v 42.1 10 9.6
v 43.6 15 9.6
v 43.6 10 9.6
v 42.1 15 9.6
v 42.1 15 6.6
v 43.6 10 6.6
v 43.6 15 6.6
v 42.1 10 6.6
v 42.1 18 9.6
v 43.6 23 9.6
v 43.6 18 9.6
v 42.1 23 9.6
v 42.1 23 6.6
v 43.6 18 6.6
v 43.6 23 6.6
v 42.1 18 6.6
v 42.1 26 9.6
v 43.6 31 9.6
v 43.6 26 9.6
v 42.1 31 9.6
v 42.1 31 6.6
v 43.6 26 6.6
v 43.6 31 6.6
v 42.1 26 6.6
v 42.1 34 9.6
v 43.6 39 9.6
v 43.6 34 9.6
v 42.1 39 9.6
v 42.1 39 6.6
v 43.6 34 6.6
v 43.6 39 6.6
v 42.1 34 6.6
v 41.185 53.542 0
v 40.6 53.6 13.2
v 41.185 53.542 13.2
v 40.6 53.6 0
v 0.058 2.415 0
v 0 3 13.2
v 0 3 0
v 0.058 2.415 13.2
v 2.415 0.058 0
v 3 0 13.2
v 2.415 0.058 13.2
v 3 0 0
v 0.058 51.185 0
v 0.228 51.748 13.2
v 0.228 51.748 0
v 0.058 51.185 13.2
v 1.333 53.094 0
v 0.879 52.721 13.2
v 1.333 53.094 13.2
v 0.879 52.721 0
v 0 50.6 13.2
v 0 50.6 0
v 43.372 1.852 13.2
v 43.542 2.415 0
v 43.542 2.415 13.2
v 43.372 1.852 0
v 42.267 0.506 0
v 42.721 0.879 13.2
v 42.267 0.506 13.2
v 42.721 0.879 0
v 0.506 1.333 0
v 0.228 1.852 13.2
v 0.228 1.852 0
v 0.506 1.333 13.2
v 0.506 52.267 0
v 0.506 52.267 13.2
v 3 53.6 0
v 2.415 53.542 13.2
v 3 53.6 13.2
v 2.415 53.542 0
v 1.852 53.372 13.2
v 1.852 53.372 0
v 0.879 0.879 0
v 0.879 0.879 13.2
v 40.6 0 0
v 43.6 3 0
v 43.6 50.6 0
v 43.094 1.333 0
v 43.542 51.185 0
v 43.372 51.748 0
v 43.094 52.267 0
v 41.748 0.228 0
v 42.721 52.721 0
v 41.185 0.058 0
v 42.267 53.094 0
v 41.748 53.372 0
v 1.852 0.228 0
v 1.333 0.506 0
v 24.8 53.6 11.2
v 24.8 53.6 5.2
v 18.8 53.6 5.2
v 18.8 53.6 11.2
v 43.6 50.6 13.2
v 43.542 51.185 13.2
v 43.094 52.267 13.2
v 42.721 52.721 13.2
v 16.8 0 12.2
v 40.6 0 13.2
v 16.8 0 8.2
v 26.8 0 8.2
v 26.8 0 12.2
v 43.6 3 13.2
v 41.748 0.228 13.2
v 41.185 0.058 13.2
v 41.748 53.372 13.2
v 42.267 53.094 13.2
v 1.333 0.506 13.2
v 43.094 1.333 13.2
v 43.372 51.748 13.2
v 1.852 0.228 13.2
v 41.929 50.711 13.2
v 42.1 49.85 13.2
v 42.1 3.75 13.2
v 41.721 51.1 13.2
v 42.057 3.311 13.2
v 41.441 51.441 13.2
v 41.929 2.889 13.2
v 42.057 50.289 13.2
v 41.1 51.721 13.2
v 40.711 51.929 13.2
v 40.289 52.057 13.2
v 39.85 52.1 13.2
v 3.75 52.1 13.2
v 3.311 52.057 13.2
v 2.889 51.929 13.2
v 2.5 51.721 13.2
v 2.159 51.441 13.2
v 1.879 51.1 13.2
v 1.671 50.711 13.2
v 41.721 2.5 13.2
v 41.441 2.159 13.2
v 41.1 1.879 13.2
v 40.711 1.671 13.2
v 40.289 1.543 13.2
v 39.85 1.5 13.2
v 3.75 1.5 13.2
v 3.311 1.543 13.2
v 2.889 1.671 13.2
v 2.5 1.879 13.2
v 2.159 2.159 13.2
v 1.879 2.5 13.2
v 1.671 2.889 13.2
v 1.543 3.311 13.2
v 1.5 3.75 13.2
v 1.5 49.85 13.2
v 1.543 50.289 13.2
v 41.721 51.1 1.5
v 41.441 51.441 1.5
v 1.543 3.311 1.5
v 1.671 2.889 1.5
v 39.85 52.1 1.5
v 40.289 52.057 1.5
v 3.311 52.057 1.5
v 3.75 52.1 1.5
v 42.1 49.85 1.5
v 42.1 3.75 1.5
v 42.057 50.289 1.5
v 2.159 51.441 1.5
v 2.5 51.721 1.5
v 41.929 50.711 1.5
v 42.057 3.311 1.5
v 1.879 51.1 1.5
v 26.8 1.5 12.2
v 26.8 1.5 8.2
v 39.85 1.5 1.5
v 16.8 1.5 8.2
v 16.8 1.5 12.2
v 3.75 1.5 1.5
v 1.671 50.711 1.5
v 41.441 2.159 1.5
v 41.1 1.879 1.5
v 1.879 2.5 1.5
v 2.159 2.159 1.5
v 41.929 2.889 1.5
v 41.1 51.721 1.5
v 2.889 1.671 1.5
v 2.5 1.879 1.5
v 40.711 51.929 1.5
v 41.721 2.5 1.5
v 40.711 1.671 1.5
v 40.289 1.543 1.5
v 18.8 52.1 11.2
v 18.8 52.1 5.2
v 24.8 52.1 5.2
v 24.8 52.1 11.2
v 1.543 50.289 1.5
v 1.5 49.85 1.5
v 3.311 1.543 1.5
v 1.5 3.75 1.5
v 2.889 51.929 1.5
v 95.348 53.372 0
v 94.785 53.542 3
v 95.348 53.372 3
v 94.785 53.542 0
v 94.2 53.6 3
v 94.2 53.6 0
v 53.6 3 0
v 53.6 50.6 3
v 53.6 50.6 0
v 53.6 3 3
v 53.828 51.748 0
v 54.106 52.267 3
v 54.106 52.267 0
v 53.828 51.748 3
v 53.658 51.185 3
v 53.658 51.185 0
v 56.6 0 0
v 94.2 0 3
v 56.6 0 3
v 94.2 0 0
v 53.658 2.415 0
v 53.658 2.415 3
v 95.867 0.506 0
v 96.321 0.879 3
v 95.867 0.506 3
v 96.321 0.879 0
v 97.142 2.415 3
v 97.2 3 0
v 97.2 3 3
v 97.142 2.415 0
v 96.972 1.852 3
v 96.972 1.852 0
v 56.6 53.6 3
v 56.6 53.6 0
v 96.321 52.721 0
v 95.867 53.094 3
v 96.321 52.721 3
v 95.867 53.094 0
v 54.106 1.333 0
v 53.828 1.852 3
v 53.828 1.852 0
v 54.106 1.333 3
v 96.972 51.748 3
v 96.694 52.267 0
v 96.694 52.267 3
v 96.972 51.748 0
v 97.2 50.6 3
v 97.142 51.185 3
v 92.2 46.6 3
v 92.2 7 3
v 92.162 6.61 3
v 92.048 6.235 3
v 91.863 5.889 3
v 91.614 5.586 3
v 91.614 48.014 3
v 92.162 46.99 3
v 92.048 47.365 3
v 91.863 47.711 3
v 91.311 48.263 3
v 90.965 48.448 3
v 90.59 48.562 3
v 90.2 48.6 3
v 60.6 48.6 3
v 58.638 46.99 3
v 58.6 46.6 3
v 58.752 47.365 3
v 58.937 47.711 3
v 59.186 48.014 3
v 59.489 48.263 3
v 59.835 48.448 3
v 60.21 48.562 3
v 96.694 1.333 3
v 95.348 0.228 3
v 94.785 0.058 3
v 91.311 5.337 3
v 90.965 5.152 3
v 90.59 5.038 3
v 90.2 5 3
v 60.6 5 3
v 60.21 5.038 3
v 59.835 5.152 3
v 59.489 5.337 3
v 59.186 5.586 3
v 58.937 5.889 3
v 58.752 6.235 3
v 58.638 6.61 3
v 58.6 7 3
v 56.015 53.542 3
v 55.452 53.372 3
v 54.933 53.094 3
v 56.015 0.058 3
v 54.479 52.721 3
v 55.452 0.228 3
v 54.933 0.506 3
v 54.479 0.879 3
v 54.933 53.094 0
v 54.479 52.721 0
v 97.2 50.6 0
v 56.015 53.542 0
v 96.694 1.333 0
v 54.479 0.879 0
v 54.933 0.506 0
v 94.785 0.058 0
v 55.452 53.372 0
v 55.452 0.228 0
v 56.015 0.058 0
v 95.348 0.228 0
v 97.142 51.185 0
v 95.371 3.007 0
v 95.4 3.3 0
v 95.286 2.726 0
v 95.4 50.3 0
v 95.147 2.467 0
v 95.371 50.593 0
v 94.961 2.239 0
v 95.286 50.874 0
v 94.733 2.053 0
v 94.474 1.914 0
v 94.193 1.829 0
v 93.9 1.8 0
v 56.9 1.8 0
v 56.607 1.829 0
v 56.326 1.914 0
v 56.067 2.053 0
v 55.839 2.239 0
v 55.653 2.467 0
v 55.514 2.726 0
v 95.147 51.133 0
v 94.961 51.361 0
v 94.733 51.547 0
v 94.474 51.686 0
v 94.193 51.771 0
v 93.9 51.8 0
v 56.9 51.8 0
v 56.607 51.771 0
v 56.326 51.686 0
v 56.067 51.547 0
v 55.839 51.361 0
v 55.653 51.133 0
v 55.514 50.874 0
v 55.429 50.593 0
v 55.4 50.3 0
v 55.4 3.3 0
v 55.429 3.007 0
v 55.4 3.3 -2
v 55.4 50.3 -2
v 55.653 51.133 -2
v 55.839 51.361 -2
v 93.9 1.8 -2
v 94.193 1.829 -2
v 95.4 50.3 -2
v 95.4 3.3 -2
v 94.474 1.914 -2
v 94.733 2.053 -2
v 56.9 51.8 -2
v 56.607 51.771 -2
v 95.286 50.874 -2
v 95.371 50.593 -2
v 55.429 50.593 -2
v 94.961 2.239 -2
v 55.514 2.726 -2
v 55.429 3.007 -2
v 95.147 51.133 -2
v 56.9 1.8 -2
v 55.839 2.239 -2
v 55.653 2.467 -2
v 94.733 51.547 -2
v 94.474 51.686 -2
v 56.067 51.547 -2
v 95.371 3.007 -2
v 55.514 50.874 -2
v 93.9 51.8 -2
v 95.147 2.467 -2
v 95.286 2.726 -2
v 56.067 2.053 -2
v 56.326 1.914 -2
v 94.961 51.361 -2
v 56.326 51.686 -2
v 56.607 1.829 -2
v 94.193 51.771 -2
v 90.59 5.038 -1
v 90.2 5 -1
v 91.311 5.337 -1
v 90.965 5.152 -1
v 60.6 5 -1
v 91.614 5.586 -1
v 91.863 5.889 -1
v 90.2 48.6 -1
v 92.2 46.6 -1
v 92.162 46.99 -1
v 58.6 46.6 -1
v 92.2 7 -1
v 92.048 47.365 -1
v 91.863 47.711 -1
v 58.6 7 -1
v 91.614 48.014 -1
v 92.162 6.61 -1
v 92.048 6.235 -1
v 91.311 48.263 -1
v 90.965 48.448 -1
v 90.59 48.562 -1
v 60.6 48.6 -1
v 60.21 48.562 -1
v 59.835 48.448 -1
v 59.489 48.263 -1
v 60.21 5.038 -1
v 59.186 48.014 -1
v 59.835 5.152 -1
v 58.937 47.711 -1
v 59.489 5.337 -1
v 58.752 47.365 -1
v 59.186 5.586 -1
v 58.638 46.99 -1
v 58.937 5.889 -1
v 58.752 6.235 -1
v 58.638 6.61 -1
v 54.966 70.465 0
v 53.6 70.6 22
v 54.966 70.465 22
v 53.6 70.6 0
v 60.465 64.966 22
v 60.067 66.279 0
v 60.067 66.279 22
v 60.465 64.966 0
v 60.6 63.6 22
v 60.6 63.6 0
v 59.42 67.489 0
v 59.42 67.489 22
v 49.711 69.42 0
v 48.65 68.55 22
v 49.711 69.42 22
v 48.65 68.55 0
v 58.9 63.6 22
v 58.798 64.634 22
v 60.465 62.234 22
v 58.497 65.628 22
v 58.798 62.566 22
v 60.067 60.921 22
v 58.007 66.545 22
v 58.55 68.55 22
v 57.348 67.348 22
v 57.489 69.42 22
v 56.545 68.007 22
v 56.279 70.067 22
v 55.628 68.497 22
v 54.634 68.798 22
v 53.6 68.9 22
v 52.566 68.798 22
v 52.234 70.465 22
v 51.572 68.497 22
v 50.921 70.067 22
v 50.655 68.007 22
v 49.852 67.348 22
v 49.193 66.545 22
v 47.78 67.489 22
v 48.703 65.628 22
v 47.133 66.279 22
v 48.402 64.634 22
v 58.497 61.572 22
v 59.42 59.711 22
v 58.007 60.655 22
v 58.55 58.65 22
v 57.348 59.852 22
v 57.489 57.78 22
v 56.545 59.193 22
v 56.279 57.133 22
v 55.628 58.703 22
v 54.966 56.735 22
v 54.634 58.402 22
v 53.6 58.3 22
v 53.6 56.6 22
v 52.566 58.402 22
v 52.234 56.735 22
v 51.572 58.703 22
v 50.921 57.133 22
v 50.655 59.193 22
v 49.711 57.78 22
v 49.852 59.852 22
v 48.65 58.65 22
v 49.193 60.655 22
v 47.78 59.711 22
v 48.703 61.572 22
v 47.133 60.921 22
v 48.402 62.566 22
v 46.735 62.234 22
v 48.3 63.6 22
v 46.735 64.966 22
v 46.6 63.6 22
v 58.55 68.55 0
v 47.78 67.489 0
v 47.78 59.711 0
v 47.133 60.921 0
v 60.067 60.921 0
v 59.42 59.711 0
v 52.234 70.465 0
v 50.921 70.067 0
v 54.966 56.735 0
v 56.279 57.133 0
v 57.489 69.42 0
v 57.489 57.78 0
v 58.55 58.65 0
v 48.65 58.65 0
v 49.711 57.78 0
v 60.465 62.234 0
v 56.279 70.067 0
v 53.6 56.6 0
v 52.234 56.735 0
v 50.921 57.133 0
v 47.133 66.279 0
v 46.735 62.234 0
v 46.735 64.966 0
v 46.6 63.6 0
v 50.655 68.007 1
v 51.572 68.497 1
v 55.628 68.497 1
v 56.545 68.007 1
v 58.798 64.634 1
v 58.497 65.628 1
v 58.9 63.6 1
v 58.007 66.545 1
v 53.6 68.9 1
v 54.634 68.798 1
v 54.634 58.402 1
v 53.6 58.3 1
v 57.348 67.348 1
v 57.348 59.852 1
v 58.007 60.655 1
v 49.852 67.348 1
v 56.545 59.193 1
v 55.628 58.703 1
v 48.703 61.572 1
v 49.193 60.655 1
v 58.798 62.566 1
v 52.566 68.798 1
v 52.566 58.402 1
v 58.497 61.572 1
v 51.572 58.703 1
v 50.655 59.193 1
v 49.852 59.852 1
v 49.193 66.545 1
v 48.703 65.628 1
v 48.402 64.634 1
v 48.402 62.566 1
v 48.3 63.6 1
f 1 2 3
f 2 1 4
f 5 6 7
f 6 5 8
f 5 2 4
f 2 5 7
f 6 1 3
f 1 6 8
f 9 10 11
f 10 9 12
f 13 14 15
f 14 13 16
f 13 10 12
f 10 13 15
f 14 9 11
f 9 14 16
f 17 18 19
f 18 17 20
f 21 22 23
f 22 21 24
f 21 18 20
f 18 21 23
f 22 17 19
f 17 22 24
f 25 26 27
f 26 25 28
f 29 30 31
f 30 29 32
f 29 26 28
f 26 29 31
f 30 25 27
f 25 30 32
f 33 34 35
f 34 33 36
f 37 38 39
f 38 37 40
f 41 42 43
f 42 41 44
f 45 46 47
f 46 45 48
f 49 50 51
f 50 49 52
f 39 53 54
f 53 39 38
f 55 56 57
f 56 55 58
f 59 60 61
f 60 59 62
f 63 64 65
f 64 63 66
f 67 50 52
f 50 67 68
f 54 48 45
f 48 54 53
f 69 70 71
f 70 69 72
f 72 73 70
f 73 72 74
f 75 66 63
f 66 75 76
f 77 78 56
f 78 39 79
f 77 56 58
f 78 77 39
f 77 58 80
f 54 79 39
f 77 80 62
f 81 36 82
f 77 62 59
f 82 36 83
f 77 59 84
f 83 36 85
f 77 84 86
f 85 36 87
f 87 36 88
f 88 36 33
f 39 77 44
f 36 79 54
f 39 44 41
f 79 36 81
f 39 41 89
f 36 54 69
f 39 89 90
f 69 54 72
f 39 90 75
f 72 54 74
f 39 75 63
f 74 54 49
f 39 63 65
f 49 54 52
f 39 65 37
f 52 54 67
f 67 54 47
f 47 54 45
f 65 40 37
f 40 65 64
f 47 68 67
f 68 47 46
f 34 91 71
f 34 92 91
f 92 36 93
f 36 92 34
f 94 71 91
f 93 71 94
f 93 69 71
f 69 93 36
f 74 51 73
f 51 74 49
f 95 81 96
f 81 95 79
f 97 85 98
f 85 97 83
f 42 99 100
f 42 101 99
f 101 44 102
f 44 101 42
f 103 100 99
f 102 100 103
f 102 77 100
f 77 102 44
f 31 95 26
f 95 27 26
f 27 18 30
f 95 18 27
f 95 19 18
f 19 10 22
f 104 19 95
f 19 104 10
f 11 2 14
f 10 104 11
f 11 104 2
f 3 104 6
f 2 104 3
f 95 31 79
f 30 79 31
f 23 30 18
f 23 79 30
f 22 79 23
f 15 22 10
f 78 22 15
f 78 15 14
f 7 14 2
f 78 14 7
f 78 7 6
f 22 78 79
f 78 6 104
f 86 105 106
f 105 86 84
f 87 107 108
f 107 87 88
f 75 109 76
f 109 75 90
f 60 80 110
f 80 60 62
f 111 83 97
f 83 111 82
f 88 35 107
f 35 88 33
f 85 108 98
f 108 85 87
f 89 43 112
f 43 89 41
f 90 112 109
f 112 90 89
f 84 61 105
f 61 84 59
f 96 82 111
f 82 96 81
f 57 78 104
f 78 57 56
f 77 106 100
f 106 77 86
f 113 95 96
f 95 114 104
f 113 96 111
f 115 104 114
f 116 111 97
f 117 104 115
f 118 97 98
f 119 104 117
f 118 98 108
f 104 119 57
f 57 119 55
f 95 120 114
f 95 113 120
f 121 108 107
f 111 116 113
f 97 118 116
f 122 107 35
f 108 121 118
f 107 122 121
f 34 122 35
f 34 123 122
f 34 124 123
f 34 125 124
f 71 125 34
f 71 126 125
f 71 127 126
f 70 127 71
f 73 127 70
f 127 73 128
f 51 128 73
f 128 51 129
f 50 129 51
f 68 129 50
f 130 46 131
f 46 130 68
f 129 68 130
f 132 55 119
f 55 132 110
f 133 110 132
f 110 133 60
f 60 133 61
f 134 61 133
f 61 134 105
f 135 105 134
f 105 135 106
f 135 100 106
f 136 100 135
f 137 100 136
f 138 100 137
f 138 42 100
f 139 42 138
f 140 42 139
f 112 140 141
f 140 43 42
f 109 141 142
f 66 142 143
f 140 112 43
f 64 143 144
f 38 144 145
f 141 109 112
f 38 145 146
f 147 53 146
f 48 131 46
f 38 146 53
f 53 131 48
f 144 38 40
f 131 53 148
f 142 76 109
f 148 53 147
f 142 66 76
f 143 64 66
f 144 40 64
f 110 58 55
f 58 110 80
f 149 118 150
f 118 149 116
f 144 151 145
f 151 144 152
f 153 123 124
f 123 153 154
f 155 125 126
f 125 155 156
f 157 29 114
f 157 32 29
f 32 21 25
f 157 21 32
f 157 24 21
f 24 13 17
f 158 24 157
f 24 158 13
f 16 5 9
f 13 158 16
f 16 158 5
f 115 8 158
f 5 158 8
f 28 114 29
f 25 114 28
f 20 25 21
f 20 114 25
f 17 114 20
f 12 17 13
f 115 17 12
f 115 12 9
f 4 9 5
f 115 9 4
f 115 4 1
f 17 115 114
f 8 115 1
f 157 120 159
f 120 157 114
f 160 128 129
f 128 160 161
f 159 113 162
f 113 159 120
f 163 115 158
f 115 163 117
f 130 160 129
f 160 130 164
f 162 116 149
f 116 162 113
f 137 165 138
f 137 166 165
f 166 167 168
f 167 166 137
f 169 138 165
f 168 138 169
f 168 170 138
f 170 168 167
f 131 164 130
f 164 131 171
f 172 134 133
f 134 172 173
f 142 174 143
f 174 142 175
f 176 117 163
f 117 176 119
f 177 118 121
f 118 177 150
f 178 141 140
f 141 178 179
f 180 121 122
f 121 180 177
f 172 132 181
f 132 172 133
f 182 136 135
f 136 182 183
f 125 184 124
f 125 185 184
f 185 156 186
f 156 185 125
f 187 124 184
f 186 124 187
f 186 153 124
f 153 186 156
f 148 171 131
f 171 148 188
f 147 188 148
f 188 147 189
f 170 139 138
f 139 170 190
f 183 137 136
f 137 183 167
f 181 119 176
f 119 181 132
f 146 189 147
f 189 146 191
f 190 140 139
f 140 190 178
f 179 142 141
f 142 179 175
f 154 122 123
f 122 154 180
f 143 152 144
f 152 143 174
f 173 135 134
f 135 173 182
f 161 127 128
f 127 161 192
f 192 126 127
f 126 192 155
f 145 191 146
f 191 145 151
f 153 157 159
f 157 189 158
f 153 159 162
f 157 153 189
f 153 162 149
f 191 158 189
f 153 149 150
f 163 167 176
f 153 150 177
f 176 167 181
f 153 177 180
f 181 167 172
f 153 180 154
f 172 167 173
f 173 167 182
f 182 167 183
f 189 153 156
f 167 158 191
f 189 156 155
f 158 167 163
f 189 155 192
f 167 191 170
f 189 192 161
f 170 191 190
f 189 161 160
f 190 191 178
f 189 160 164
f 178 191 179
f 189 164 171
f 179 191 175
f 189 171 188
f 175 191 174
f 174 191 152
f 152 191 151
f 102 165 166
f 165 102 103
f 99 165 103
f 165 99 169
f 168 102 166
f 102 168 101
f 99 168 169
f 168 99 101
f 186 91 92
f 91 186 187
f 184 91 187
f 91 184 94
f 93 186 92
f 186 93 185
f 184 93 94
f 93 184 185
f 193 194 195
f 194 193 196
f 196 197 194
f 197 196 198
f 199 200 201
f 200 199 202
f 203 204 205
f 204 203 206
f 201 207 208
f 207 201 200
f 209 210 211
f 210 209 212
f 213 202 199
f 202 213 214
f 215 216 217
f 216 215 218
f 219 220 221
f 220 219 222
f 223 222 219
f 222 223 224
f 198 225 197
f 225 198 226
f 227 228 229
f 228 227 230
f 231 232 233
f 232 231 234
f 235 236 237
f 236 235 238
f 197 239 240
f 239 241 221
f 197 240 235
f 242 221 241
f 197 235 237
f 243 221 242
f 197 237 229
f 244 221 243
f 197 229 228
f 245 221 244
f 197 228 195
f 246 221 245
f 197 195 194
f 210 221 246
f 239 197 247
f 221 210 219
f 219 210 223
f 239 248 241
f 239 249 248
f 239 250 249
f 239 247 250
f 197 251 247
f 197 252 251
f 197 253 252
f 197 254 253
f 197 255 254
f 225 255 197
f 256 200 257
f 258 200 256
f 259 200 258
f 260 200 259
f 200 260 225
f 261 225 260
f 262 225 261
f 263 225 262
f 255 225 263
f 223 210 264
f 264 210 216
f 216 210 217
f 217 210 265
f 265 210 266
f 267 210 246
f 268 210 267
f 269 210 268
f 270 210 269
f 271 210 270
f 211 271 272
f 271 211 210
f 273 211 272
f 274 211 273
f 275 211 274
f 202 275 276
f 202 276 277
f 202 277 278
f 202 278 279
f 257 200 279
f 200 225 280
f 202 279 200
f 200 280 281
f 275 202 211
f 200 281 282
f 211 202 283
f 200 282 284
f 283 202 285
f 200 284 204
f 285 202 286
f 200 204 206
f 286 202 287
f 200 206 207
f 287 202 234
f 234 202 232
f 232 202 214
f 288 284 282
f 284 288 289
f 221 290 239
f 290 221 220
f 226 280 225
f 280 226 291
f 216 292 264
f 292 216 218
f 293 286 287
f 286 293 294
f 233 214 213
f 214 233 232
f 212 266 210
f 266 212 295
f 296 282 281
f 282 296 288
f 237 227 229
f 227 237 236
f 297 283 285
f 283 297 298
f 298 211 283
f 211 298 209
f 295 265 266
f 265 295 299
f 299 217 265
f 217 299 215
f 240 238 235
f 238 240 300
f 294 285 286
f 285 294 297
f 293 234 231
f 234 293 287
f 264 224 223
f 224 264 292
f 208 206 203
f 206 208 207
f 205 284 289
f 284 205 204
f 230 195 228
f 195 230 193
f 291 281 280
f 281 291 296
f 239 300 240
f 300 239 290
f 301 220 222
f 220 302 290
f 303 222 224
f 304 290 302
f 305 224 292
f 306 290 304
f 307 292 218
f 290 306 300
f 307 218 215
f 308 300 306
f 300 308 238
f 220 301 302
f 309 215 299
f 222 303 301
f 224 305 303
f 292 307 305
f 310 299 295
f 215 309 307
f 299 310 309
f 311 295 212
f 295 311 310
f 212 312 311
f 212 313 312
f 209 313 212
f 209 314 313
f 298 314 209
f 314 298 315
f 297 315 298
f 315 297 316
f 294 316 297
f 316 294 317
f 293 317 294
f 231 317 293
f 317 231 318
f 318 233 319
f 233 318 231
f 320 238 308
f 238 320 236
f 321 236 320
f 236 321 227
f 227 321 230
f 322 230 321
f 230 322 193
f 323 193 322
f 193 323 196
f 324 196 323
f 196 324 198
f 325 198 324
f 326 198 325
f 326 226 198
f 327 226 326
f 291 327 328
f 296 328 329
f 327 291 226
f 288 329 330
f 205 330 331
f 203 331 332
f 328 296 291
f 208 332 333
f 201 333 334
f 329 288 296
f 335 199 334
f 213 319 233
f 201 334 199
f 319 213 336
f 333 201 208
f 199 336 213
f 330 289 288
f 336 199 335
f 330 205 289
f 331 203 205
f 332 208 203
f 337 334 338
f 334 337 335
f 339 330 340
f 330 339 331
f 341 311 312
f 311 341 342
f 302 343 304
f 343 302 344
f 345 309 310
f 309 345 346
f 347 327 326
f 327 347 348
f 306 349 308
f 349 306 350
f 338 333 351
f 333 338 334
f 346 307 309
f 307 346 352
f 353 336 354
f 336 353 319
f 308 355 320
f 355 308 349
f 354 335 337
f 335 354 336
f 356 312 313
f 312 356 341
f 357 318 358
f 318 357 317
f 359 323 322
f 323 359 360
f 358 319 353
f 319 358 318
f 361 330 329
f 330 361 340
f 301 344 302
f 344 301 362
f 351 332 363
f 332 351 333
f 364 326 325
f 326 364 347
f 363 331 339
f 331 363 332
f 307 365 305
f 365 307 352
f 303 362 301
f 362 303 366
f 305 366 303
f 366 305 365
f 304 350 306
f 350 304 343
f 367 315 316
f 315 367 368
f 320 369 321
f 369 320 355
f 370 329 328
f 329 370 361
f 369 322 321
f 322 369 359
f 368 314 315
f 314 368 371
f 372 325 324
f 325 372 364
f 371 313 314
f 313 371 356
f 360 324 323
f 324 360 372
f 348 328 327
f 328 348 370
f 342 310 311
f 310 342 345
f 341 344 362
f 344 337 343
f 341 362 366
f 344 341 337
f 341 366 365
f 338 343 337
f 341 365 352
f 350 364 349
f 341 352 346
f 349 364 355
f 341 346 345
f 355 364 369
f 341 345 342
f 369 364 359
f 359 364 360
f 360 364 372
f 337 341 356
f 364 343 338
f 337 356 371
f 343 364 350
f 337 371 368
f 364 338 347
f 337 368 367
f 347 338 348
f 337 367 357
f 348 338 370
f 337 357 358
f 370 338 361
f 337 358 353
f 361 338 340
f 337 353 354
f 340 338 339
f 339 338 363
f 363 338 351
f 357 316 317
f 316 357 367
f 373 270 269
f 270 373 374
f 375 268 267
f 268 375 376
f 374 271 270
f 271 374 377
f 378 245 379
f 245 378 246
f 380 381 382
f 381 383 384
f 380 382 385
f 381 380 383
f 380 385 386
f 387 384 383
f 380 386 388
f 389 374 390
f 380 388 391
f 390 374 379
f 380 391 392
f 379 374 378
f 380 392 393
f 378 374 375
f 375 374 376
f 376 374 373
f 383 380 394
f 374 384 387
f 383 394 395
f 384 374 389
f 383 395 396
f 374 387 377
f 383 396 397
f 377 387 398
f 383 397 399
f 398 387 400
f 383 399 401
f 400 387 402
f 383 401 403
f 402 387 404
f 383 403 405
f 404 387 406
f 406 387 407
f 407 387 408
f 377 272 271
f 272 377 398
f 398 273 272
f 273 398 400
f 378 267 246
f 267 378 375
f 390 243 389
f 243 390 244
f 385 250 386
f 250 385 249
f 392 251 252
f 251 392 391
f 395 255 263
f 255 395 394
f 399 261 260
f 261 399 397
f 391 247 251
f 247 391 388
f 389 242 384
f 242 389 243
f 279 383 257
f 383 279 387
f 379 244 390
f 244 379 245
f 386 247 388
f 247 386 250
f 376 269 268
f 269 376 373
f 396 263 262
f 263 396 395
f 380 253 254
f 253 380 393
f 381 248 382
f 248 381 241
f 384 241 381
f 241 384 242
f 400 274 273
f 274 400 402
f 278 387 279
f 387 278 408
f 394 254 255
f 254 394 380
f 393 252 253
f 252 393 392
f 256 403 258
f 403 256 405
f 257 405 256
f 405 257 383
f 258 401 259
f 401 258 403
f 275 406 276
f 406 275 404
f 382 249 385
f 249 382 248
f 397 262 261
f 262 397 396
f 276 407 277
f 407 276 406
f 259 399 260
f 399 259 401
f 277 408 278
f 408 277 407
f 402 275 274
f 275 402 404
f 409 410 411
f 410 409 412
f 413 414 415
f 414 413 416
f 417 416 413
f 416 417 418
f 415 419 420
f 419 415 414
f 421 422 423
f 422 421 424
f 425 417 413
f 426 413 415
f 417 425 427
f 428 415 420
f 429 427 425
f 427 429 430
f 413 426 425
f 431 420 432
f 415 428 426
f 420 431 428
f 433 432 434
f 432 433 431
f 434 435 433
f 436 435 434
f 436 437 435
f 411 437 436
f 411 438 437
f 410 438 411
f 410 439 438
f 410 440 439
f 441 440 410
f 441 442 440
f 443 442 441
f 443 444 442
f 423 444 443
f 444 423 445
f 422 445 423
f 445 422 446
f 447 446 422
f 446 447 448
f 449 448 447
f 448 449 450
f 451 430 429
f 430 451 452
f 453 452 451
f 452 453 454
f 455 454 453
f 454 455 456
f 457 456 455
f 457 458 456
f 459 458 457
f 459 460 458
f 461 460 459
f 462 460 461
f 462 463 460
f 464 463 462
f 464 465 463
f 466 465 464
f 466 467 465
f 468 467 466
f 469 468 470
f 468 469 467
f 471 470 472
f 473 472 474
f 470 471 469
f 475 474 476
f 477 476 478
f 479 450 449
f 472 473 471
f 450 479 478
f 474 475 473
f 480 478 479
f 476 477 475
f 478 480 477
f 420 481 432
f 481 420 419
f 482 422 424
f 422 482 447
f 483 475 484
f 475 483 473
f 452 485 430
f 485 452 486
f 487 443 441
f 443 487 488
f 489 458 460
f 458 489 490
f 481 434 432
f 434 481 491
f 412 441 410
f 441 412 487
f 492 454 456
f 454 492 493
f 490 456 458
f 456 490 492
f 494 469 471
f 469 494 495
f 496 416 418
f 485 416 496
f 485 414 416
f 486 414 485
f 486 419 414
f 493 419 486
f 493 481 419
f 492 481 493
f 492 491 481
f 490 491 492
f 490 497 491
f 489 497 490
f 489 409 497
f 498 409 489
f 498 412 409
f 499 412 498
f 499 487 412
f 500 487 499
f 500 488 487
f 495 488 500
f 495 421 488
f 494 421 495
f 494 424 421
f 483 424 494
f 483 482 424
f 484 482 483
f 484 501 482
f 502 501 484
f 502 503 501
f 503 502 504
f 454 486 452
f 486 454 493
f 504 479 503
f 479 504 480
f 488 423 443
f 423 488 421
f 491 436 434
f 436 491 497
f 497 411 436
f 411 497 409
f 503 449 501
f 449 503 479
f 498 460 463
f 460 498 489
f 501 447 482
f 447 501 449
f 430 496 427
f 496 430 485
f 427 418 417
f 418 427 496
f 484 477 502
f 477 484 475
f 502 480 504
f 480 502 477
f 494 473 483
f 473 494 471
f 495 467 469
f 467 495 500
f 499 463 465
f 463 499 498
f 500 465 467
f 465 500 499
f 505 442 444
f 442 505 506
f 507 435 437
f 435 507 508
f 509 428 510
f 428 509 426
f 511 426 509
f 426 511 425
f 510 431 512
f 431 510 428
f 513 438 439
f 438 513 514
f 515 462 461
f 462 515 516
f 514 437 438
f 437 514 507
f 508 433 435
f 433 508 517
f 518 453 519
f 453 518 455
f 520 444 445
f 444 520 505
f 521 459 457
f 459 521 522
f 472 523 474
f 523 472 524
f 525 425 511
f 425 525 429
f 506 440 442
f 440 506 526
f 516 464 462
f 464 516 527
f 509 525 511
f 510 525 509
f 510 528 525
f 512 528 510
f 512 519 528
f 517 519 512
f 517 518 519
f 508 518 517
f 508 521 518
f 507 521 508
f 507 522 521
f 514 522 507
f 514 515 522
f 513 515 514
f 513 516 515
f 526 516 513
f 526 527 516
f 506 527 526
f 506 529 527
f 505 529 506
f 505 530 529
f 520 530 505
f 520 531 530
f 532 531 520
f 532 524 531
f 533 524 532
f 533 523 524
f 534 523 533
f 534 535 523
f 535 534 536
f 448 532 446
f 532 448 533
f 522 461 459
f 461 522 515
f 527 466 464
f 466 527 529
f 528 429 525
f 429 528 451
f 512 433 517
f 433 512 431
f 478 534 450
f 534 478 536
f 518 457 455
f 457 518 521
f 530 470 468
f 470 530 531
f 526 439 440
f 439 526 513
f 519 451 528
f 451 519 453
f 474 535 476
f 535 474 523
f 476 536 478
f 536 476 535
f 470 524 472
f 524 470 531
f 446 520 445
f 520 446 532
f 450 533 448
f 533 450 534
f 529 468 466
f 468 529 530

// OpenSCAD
/*
 * ╔════════════════════════════════════════════════════════════════════════════════════════════════════════════╗
 * ║                                                                                                            ║
 * ║     ⚡ A E O N   P M I C   E N C L O S U R E ⚡                                                            ║
 * ║                                                                                                            ║
 * ║     OpenSCAD design for 3D printing (TPU recommended for flexibility)                                     ║
 * ║                                                                                                            ║
 * ╚════════════════════════════════════════════════════════════════════════════════════════════════════════════╝
 */

// ═══════════════════════════════════════════════════════════════════════════════════════════════════════════
// PARAMETERS
// ═══════════════════════════════════════════════════════════════════════════════════════════════════════════

// PCB dimensions
pcb_width = 40;
pcb_length = 25;
pcb_thickness = 1.6;

// Battery dimensions (under PCB)
battery_width = 35;
battery_length = 50;
battery_thickness = 8;

// Supercapacitor
supercap_diameter = 10;
supercap_height = 20;

// Wall thickness
wall = 1.5;

// Tolerances
tol = 0.3;

// Total enclosure size
enc_width = max(pcb_width, battery_width) + 2*wall + 2*tol;
enc_length = max(pcb_length, battery_length) + 2*wall + 2*tol;
enc_height = pcb_thickness + battery_thickness + 2*wall + 2*tol;

// Corner radius
corner_r = 3;

// ═══════════════════════════════════════════════════════════════════════════════════════════════════════════
// MODULES
// ═══════════════════════════════════════════════════════════════════════════════════════════════════════════

module rounded_box(w, l, h, r) {
    hull() {
        for (x = [r, w-r]) {
            for (y = [r, l-r]) {
                translate([x, y, 0]) cylinder(h=h, r=r, $fn=32);
            }
        }
    }
}

module enclosure_base() {
    difference() {
        // Outer shell
        rounded_box(enc_width, enc_length, enc_height, corner_r);
        
        // Inner cavity
        translate([wall, wall, wall])
            rounded_box(enc_width - 2*wall, enc_length - 2*wall, enc_height, corner_r - wall/2);
        
        // USB-C port cutout
        translate([enc_width/2 - 5, -1, enc_height - 5])
            cube([10, wall + 2, 4]);
        
        // LED window
        translate([enc_width/2 - 3, enc_length - wall - 1, enc_height - 8])
            cube([6, wall + 2, 6]);
        
        // Button hole
        translate([5, enc_length/2, enc_height - wall - 1])
            cylinder(h=wall + 2, d=6, $fn=32);
        
        // Ventilation slots
        for (i = [0:3]) {
            translate([enc_width - wall - 1, 10 + i*8, enc_height/2])
                cube([wall + 2, 5, 3]);
        }
    }
}

module enclosure_lid() {
    lid_height = 3;
    lip = 2;
    
    difference() {
        union() {
            // Main lid
            rounded_box(enc_width, enc_length, lid_height, corner_r);
            
            // Inner lip
            translate([wall + tol, wall + tol, -lip])
                rounded_box(enc_width - 2*wall - 2*tol, enc_length - 2*wall - 2*tol, lip, corner_r - wall);
        }
        
        // Solar panel window (large opening)
        translate([5, 5, -1])
            rounded_box(enc_width - 10, enc_length - 10, lid_height + 2, 2);
    }
}

module supercap_holder() {
    difference() {
        cylinder(h=supercap_height + 2, d=supercap_diameter + 4, $fn=32);
        translate([0, 0, 1])
            cylinder(h=supercap_height + 2, d=supercap_diameter + tol*2, $fn=32);
    }
}

// ═══════════════════════════════════════════════════════════════════════════════════════════════════════════
// ASSEMBLY
// ═══════════════════════════════════════════════════════════════════════════════════════════════════════════

// Uncomment to render individual parts:

// Base
enclosure_base();

// Lid (offset for printing)
translate([enc_width + 10, 0, 0])
    enclosure_lid();

// Supercap holder (optional, mounts inside)
translate([enc_width + 10, enc_length + 10, 0])
    supercap_holder();

// ═══════════════════════════════════════════════════════════════════════════════════════════════════════════
// PRINT SETTINGS
// ═══════════════════════════════════════════════════════════════════════════════════════════════════════════

/*
Recommended settings:
- Material: TPU 95A (flexible) or PETG (rigid)
- Layer height: 0.2mm
- Infill: 20%
- Supports: Yes for base (USB cutout)
- Brim: Yes for TPU

Total dimensions:
- Width: 44mm
- Length: 54mm  
- Height: 14mm

Weight estimate: ~15g (TPU)
*/
